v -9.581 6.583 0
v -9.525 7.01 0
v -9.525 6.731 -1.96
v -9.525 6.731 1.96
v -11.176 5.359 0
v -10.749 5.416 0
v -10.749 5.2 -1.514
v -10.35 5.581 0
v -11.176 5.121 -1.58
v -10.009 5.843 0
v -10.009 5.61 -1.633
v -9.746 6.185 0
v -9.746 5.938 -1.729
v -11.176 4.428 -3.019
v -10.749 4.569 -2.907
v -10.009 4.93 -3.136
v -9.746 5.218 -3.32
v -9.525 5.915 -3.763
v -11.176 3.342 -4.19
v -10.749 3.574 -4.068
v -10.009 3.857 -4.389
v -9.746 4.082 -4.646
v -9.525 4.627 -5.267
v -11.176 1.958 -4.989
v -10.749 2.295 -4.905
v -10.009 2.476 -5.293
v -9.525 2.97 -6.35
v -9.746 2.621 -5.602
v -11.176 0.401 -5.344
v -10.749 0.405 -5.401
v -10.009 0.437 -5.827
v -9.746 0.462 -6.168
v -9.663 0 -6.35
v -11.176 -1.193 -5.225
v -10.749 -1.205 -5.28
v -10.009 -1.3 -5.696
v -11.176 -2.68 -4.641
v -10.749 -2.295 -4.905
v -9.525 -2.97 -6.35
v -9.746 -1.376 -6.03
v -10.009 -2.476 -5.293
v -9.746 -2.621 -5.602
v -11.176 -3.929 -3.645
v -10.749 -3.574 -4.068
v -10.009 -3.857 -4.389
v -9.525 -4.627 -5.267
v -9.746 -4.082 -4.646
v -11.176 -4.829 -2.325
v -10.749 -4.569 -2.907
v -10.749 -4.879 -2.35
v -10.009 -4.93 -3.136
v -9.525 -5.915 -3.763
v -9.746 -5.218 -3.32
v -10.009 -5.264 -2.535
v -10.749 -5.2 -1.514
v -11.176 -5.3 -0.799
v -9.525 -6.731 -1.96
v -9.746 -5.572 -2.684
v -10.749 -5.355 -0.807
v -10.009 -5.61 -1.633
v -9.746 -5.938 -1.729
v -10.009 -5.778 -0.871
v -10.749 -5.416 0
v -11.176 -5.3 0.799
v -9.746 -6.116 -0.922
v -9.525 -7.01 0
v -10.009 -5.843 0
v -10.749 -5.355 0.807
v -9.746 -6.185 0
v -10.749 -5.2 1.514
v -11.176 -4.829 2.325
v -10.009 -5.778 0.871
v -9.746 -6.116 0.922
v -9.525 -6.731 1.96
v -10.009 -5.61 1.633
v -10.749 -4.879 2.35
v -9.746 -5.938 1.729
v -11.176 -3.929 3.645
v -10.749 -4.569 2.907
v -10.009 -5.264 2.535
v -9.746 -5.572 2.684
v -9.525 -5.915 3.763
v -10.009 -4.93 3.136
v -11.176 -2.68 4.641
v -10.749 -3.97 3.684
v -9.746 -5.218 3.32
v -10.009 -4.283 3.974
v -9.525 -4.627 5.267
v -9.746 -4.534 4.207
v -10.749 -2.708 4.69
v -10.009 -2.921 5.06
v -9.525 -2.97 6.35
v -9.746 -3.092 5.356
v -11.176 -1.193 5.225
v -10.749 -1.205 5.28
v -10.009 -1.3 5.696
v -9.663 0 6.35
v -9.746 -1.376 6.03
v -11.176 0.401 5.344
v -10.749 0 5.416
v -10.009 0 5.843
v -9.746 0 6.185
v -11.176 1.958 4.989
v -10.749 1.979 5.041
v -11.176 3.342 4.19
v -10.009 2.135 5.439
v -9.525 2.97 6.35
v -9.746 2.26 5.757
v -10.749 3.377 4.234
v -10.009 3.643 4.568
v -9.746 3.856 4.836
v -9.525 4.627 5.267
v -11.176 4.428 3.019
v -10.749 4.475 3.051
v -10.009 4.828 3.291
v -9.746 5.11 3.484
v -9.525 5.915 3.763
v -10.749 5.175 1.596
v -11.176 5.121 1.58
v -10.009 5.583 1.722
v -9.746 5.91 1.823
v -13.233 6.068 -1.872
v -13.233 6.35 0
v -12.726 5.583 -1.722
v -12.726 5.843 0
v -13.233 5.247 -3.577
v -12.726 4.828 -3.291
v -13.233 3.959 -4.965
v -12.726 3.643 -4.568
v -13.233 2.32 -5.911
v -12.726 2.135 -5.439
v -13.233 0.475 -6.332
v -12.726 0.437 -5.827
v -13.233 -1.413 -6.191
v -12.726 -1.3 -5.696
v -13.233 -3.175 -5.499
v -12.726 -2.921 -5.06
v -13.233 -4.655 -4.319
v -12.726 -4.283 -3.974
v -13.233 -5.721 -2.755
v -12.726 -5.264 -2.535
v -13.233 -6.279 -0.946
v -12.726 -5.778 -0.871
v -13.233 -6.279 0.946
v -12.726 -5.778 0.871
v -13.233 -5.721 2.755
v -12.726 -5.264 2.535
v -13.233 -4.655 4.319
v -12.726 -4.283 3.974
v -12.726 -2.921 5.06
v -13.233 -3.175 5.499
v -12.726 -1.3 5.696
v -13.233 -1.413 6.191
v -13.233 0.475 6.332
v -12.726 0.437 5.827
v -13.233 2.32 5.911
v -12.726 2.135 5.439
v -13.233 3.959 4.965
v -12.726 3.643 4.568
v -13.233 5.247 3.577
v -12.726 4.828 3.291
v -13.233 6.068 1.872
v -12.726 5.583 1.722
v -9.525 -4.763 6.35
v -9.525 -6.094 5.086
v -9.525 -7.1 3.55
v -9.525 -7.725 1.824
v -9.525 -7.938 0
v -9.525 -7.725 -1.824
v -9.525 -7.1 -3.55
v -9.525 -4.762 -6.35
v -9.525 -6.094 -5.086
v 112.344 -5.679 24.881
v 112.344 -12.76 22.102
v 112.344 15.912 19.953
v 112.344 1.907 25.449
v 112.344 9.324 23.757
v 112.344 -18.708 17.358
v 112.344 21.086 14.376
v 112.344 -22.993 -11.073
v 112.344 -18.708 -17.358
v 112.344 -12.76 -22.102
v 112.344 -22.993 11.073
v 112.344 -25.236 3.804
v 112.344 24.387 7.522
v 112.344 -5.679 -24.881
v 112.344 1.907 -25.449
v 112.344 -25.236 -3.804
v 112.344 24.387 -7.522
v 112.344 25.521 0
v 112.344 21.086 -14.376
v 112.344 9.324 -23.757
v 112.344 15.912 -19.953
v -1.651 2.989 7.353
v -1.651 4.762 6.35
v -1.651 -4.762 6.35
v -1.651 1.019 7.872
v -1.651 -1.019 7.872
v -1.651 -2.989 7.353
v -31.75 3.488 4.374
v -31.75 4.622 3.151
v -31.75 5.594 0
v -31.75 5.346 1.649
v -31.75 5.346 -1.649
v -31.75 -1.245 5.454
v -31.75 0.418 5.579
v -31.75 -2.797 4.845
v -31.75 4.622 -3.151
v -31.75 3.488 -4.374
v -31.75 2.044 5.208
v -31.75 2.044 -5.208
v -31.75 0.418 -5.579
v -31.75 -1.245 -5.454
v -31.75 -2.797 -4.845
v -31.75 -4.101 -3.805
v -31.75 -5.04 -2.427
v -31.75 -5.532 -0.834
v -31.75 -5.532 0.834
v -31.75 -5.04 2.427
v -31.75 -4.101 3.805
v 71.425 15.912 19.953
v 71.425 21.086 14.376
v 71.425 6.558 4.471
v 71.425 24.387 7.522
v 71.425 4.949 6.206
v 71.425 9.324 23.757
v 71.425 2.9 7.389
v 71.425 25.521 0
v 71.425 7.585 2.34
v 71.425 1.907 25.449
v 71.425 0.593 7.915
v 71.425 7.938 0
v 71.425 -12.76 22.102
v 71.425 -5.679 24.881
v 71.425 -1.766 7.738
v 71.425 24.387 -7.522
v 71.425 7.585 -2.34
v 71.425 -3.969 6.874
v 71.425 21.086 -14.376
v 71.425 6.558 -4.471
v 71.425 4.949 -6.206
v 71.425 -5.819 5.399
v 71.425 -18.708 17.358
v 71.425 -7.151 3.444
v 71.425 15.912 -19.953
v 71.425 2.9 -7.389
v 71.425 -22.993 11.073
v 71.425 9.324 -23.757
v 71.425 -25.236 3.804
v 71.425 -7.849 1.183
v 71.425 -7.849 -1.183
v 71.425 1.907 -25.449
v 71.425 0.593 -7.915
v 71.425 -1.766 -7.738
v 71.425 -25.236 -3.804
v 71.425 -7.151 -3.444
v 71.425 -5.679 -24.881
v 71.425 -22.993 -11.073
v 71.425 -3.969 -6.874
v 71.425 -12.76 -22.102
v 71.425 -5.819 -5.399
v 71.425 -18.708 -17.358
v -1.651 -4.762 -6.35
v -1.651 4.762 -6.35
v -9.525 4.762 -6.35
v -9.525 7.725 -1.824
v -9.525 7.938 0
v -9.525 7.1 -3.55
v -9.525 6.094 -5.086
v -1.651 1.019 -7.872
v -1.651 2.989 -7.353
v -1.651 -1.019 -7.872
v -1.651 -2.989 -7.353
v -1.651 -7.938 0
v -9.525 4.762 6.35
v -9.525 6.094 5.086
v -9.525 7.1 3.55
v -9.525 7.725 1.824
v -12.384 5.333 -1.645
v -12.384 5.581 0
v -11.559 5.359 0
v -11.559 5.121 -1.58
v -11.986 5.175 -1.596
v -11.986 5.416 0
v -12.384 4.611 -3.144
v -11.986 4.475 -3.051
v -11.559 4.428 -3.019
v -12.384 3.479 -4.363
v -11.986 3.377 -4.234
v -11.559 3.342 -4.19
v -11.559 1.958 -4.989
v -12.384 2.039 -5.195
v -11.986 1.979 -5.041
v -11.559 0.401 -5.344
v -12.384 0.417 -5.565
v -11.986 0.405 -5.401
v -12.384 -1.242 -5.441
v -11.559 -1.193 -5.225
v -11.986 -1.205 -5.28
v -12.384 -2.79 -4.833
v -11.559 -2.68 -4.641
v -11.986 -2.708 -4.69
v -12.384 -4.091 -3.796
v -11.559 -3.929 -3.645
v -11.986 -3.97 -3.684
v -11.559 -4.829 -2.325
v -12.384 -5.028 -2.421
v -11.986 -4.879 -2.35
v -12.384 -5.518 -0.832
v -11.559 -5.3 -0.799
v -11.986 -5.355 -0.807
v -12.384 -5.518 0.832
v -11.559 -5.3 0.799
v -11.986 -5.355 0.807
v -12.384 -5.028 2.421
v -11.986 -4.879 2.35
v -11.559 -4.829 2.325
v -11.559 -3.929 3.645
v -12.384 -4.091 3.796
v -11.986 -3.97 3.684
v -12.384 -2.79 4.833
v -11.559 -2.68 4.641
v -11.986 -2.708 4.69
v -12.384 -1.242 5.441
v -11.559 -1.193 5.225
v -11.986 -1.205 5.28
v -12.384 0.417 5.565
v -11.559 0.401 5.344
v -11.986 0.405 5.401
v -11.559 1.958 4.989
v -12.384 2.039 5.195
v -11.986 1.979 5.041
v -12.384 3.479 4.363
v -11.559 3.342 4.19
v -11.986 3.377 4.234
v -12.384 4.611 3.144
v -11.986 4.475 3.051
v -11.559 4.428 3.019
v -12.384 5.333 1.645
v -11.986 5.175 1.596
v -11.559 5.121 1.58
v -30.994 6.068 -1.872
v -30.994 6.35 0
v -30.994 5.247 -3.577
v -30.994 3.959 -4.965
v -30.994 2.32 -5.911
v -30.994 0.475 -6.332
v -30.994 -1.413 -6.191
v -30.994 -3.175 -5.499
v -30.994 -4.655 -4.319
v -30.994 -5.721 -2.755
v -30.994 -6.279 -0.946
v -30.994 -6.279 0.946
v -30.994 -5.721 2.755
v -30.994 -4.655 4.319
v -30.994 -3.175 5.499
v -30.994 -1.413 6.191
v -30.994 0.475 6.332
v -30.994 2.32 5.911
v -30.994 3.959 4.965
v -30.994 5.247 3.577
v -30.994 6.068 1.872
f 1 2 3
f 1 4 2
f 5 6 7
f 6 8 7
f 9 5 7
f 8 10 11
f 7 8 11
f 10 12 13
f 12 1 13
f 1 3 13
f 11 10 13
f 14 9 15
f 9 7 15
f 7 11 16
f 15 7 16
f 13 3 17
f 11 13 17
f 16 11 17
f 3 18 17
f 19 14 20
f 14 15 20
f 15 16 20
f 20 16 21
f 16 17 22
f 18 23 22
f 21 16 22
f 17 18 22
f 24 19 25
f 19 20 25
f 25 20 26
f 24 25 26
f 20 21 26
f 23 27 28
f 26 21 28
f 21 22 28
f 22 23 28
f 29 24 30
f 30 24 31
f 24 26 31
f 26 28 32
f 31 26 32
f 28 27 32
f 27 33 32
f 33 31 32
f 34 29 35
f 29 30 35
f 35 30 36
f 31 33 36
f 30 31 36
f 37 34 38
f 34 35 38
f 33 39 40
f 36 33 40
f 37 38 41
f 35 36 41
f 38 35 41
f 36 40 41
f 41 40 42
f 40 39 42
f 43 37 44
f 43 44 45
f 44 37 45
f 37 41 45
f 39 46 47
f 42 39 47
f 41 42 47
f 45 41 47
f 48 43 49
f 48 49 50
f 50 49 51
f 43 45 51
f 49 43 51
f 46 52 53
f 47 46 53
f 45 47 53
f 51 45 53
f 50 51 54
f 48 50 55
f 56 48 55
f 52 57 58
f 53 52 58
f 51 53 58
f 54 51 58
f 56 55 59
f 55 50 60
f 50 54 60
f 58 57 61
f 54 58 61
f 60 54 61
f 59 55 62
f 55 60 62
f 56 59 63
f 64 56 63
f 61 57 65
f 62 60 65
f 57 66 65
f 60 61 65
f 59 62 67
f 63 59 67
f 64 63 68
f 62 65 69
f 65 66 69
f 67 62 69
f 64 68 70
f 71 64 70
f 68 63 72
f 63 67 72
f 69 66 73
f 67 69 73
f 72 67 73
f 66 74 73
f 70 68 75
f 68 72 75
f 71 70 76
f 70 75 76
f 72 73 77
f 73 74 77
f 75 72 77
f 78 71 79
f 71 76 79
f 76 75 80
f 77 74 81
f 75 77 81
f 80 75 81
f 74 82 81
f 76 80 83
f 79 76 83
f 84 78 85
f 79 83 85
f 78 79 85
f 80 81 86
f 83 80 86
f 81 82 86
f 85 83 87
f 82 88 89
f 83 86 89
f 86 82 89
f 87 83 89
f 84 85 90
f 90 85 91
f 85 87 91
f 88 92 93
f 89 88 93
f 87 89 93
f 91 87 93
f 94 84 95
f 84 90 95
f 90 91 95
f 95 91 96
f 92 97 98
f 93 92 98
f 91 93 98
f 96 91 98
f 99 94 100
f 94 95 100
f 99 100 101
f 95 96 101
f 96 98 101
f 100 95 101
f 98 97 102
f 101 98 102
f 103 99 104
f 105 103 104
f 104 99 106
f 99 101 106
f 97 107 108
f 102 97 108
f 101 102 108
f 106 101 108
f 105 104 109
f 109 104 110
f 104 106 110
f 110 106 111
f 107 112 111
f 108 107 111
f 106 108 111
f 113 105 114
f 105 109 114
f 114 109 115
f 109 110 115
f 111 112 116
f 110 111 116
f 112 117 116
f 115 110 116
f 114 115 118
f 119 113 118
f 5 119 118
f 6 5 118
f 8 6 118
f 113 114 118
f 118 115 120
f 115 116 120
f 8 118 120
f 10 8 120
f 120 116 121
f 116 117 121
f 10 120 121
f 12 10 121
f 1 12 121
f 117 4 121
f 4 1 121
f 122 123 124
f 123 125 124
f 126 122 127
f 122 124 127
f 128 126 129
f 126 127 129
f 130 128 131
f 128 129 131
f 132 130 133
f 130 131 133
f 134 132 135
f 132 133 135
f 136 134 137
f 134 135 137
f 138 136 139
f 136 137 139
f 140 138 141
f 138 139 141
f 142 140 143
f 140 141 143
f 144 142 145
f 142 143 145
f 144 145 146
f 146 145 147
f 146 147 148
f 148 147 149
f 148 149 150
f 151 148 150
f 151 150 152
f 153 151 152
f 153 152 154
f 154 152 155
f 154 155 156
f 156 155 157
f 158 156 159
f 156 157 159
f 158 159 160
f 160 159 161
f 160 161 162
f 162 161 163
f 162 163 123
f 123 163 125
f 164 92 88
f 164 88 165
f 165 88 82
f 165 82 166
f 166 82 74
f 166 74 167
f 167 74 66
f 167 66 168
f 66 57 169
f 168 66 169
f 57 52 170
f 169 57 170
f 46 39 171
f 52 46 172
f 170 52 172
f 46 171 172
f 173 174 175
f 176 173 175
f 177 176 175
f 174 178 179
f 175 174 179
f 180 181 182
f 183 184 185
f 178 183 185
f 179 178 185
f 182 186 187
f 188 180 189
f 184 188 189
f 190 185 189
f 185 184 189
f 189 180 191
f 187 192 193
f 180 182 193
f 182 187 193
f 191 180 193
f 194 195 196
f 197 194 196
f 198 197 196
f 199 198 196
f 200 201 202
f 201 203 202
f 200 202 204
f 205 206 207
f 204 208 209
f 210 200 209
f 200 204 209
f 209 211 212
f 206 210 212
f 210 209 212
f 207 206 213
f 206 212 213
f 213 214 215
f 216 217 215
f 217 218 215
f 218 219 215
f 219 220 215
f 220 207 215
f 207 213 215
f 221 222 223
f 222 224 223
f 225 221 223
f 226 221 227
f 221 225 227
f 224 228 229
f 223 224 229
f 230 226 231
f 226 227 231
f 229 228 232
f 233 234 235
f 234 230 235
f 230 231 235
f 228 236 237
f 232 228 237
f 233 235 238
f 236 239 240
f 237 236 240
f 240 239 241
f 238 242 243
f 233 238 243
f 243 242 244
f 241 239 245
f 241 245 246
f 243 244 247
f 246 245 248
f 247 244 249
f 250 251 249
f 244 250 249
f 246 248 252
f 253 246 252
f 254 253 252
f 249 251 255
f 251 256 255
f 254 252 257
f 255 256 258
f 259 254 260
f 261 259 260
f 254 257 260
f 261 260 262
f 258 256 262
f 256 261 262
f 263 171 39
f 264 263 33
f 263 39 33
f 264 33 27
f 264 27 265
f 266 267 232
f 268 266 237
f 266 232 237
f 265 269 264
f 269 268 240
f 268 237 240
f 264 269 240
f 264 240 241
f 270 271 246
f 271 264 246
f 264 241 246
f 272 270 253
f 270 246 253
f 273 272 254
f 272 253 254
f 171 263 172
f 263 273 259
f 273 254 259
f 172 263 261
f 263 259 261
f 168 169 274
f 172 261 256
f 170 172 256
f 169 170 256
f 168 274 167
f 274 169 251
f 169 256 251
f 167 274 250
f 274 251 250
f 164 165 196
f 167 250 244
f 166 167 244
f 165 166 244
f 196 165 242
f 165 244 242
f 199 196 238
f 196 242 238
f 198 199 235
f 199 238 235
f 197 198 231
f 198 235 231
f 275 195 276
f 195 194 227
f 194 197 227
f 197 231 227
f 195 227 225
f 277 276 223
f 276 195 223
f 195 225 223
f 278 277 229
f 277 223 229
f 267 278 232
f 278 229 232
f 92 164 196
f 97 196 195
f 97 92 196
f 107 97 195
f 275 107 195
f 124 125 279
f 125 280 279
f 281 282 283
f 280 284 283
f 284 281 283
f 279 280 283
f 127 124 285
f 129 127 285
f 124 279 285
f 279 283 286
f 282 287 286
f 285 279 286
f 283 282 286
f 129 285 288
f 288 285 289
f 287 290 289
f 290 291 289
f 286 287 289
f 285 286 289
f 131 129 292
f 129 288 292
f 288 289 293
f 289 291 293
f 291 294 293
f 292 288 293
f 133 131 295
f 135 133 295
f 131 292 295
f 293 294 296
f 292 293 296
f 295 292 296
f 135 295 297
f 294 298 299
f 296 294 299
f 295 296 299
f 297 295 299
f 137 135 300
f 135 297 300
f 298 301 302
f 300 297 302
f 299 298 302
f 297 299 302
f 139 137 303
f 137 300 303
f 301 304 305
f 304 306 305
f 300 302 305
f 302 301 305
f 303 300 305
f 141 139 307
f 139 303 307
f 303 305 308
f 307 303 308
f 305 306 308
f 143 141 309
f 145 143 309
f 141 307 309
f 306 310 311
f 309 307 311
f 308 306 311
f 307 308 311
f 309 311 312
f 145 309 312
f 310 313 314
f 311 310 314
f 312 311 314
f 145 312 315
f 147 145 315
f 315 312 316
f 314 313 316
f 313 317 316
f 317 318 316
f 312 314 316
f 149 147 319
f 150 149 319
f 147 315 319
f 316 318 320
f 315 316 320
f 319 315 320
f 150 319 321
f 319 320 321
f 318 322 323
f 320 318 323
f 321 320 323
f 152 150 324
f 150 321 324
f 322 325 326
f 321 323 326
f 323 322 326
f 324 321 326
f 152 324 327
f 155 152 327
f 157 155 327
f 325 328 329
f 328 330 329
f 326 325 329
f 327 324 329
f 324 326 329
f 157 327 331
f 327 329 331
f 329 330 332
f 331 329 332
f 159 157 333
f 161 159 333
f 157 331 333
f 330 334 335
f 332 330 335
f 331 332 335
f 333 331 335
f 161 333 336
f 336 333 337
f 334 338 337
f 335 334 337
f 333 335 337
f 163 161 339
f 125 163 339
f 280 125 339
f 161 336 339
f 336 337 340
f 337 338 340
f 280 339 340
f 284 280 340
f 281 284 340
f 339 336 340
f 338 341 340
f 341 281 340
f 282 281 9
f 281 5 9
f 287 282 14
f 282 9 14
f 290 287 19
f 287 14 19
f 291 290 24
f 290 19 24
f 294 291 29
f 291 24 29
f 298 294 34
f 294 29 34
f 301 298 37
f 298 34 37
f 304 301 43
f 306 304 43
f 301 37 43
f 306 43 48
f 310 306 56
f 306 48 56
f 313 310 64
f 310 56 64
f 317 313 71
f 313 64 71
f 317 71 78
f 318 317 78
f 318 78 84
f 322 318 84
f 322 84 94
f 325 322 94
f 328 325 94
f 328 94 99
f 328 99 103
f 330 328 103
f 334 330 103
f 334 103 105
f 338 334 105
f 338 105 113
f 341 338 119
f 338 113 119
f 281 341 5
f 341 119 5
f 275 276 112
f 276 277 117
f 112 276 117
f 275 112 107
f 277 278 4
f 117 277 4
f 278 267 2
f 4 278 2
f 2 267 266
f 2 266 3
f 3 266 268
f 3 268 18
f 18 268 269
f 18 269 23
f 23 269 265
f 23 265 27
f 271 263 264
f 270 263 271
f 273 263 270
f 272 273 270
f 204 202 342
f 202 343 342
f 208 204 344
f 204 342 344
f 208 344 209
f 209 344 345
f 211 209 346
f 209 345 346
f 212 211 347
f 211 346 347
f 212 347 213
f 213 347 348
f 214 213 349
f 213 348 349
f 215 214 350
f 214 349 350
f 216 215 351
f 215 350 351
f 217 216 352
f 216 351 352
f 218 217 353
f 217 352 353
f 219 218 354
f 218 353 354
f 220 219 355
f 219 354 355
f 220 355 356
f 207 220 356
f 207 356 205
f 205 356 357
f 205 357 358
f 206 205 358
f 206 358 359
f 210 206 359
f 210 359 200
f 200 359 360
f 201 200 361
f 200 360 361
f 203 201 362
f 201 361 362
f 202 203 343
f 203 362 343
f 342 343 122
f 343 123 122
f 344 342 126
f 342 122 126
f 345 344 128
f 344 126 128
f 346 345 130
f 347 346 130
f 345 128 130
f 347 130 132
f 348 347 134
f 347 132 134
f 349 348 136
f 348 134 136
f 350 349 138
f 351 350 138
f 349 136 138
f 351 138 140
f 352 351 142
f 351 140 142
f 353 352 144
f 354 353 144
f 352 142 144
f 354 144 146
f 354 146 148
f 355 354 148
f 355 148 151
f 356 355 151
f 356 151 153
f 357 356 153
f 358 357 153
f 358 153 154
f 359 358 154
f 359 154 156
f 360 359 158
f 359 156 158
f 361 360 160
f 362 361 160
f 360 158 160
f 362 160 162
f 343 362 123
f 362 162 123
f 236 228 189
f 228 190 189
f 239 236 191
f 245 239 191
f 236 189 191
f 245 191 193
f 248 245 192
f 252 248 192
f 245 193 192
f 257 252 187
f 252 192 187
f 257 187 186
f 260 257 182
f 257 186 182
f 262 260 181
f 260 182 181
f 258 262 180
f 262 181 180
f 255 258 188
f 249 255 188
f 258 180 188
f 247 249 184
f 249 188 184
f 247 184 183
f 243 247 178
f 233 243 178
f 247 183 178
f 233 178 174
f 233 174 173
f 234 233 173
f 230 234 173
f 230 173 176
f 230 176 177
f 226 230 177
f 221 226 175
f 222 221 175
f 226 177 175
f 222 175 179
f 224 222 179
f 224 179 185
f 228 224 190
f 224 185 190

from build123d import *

# Parameters (mm, degrees)
SKETCH3_W          = 31.75
SKETCH3_H          = 31.75
SKETCH3_W_2        = 12.7
SKETCH3_H_2        = 15.875
CUT_EXTRUDE1_DEPTH = 8.509


with BuildPart() as part:
    # Sketch1 → Revolve1 (revolve)
    with BuildSketch(Plane.XY):
        Polygon((-9.525, 0), (-9.525, 7.9375), (71.4248, 7.9375), (71.4248, 25.52065), (112.3442, 25.52065), (112.3442, 0), align=None)
    revolve(axis=Axis((112.3442, 0, 0), (-1, 0, 0)))

    # Sketch2 → Revolve2 (revolve)
    with BuildSketch(Plane.XY):
        with BuildLine():
            Line((-31.75, 0), (-31.75, 5.59435))
            Line((-31.75, 5.59435), (-30.99435, 6.35))
            Line((-30.99435, 6.35), (-13.2334, 6.35))
            Line((-13.2334, 6.35), (-12.726366704, 5.842966704))
            ThreePointArc((-12.726366704, 5.842966704), (-12.190743755, 5.485074892), (-11.558933409, 5.3594))
            Line((-11.558933409, 5.3594), (-11.176, 5.3594))
            ThreePointArc((-11.176, 5.3594), (-10.008566704, 5.842966704), (-9.525, 7.0104))
            Line((-9.525, 7.0104), (-9.525, 0))
            Line((-9.525, 0), (-31.75, 0))
        make_face()
    revolve(axis=Axis((-9.525, 0, 0), (-1, 0, 0)))

    # Sketch3 → Cut-Extrude1 (cut)
    with BuildSketch(Plane(origin=(-10.16, 0, 0), x_dir=(0, 0, -1), z_dir=(1, 0, 0))):
        Rectangle(SKETCH3_W, SKETCH3_H)
        Rectangle(SKETCH3_W_2, SKETCH3_H_2, mode=Mode.SUBTRACT)
    extrude(amount=CUT_EXTRUDE1_DEPTH, mode=Mode.SUBTRACT)


solid = part.part
